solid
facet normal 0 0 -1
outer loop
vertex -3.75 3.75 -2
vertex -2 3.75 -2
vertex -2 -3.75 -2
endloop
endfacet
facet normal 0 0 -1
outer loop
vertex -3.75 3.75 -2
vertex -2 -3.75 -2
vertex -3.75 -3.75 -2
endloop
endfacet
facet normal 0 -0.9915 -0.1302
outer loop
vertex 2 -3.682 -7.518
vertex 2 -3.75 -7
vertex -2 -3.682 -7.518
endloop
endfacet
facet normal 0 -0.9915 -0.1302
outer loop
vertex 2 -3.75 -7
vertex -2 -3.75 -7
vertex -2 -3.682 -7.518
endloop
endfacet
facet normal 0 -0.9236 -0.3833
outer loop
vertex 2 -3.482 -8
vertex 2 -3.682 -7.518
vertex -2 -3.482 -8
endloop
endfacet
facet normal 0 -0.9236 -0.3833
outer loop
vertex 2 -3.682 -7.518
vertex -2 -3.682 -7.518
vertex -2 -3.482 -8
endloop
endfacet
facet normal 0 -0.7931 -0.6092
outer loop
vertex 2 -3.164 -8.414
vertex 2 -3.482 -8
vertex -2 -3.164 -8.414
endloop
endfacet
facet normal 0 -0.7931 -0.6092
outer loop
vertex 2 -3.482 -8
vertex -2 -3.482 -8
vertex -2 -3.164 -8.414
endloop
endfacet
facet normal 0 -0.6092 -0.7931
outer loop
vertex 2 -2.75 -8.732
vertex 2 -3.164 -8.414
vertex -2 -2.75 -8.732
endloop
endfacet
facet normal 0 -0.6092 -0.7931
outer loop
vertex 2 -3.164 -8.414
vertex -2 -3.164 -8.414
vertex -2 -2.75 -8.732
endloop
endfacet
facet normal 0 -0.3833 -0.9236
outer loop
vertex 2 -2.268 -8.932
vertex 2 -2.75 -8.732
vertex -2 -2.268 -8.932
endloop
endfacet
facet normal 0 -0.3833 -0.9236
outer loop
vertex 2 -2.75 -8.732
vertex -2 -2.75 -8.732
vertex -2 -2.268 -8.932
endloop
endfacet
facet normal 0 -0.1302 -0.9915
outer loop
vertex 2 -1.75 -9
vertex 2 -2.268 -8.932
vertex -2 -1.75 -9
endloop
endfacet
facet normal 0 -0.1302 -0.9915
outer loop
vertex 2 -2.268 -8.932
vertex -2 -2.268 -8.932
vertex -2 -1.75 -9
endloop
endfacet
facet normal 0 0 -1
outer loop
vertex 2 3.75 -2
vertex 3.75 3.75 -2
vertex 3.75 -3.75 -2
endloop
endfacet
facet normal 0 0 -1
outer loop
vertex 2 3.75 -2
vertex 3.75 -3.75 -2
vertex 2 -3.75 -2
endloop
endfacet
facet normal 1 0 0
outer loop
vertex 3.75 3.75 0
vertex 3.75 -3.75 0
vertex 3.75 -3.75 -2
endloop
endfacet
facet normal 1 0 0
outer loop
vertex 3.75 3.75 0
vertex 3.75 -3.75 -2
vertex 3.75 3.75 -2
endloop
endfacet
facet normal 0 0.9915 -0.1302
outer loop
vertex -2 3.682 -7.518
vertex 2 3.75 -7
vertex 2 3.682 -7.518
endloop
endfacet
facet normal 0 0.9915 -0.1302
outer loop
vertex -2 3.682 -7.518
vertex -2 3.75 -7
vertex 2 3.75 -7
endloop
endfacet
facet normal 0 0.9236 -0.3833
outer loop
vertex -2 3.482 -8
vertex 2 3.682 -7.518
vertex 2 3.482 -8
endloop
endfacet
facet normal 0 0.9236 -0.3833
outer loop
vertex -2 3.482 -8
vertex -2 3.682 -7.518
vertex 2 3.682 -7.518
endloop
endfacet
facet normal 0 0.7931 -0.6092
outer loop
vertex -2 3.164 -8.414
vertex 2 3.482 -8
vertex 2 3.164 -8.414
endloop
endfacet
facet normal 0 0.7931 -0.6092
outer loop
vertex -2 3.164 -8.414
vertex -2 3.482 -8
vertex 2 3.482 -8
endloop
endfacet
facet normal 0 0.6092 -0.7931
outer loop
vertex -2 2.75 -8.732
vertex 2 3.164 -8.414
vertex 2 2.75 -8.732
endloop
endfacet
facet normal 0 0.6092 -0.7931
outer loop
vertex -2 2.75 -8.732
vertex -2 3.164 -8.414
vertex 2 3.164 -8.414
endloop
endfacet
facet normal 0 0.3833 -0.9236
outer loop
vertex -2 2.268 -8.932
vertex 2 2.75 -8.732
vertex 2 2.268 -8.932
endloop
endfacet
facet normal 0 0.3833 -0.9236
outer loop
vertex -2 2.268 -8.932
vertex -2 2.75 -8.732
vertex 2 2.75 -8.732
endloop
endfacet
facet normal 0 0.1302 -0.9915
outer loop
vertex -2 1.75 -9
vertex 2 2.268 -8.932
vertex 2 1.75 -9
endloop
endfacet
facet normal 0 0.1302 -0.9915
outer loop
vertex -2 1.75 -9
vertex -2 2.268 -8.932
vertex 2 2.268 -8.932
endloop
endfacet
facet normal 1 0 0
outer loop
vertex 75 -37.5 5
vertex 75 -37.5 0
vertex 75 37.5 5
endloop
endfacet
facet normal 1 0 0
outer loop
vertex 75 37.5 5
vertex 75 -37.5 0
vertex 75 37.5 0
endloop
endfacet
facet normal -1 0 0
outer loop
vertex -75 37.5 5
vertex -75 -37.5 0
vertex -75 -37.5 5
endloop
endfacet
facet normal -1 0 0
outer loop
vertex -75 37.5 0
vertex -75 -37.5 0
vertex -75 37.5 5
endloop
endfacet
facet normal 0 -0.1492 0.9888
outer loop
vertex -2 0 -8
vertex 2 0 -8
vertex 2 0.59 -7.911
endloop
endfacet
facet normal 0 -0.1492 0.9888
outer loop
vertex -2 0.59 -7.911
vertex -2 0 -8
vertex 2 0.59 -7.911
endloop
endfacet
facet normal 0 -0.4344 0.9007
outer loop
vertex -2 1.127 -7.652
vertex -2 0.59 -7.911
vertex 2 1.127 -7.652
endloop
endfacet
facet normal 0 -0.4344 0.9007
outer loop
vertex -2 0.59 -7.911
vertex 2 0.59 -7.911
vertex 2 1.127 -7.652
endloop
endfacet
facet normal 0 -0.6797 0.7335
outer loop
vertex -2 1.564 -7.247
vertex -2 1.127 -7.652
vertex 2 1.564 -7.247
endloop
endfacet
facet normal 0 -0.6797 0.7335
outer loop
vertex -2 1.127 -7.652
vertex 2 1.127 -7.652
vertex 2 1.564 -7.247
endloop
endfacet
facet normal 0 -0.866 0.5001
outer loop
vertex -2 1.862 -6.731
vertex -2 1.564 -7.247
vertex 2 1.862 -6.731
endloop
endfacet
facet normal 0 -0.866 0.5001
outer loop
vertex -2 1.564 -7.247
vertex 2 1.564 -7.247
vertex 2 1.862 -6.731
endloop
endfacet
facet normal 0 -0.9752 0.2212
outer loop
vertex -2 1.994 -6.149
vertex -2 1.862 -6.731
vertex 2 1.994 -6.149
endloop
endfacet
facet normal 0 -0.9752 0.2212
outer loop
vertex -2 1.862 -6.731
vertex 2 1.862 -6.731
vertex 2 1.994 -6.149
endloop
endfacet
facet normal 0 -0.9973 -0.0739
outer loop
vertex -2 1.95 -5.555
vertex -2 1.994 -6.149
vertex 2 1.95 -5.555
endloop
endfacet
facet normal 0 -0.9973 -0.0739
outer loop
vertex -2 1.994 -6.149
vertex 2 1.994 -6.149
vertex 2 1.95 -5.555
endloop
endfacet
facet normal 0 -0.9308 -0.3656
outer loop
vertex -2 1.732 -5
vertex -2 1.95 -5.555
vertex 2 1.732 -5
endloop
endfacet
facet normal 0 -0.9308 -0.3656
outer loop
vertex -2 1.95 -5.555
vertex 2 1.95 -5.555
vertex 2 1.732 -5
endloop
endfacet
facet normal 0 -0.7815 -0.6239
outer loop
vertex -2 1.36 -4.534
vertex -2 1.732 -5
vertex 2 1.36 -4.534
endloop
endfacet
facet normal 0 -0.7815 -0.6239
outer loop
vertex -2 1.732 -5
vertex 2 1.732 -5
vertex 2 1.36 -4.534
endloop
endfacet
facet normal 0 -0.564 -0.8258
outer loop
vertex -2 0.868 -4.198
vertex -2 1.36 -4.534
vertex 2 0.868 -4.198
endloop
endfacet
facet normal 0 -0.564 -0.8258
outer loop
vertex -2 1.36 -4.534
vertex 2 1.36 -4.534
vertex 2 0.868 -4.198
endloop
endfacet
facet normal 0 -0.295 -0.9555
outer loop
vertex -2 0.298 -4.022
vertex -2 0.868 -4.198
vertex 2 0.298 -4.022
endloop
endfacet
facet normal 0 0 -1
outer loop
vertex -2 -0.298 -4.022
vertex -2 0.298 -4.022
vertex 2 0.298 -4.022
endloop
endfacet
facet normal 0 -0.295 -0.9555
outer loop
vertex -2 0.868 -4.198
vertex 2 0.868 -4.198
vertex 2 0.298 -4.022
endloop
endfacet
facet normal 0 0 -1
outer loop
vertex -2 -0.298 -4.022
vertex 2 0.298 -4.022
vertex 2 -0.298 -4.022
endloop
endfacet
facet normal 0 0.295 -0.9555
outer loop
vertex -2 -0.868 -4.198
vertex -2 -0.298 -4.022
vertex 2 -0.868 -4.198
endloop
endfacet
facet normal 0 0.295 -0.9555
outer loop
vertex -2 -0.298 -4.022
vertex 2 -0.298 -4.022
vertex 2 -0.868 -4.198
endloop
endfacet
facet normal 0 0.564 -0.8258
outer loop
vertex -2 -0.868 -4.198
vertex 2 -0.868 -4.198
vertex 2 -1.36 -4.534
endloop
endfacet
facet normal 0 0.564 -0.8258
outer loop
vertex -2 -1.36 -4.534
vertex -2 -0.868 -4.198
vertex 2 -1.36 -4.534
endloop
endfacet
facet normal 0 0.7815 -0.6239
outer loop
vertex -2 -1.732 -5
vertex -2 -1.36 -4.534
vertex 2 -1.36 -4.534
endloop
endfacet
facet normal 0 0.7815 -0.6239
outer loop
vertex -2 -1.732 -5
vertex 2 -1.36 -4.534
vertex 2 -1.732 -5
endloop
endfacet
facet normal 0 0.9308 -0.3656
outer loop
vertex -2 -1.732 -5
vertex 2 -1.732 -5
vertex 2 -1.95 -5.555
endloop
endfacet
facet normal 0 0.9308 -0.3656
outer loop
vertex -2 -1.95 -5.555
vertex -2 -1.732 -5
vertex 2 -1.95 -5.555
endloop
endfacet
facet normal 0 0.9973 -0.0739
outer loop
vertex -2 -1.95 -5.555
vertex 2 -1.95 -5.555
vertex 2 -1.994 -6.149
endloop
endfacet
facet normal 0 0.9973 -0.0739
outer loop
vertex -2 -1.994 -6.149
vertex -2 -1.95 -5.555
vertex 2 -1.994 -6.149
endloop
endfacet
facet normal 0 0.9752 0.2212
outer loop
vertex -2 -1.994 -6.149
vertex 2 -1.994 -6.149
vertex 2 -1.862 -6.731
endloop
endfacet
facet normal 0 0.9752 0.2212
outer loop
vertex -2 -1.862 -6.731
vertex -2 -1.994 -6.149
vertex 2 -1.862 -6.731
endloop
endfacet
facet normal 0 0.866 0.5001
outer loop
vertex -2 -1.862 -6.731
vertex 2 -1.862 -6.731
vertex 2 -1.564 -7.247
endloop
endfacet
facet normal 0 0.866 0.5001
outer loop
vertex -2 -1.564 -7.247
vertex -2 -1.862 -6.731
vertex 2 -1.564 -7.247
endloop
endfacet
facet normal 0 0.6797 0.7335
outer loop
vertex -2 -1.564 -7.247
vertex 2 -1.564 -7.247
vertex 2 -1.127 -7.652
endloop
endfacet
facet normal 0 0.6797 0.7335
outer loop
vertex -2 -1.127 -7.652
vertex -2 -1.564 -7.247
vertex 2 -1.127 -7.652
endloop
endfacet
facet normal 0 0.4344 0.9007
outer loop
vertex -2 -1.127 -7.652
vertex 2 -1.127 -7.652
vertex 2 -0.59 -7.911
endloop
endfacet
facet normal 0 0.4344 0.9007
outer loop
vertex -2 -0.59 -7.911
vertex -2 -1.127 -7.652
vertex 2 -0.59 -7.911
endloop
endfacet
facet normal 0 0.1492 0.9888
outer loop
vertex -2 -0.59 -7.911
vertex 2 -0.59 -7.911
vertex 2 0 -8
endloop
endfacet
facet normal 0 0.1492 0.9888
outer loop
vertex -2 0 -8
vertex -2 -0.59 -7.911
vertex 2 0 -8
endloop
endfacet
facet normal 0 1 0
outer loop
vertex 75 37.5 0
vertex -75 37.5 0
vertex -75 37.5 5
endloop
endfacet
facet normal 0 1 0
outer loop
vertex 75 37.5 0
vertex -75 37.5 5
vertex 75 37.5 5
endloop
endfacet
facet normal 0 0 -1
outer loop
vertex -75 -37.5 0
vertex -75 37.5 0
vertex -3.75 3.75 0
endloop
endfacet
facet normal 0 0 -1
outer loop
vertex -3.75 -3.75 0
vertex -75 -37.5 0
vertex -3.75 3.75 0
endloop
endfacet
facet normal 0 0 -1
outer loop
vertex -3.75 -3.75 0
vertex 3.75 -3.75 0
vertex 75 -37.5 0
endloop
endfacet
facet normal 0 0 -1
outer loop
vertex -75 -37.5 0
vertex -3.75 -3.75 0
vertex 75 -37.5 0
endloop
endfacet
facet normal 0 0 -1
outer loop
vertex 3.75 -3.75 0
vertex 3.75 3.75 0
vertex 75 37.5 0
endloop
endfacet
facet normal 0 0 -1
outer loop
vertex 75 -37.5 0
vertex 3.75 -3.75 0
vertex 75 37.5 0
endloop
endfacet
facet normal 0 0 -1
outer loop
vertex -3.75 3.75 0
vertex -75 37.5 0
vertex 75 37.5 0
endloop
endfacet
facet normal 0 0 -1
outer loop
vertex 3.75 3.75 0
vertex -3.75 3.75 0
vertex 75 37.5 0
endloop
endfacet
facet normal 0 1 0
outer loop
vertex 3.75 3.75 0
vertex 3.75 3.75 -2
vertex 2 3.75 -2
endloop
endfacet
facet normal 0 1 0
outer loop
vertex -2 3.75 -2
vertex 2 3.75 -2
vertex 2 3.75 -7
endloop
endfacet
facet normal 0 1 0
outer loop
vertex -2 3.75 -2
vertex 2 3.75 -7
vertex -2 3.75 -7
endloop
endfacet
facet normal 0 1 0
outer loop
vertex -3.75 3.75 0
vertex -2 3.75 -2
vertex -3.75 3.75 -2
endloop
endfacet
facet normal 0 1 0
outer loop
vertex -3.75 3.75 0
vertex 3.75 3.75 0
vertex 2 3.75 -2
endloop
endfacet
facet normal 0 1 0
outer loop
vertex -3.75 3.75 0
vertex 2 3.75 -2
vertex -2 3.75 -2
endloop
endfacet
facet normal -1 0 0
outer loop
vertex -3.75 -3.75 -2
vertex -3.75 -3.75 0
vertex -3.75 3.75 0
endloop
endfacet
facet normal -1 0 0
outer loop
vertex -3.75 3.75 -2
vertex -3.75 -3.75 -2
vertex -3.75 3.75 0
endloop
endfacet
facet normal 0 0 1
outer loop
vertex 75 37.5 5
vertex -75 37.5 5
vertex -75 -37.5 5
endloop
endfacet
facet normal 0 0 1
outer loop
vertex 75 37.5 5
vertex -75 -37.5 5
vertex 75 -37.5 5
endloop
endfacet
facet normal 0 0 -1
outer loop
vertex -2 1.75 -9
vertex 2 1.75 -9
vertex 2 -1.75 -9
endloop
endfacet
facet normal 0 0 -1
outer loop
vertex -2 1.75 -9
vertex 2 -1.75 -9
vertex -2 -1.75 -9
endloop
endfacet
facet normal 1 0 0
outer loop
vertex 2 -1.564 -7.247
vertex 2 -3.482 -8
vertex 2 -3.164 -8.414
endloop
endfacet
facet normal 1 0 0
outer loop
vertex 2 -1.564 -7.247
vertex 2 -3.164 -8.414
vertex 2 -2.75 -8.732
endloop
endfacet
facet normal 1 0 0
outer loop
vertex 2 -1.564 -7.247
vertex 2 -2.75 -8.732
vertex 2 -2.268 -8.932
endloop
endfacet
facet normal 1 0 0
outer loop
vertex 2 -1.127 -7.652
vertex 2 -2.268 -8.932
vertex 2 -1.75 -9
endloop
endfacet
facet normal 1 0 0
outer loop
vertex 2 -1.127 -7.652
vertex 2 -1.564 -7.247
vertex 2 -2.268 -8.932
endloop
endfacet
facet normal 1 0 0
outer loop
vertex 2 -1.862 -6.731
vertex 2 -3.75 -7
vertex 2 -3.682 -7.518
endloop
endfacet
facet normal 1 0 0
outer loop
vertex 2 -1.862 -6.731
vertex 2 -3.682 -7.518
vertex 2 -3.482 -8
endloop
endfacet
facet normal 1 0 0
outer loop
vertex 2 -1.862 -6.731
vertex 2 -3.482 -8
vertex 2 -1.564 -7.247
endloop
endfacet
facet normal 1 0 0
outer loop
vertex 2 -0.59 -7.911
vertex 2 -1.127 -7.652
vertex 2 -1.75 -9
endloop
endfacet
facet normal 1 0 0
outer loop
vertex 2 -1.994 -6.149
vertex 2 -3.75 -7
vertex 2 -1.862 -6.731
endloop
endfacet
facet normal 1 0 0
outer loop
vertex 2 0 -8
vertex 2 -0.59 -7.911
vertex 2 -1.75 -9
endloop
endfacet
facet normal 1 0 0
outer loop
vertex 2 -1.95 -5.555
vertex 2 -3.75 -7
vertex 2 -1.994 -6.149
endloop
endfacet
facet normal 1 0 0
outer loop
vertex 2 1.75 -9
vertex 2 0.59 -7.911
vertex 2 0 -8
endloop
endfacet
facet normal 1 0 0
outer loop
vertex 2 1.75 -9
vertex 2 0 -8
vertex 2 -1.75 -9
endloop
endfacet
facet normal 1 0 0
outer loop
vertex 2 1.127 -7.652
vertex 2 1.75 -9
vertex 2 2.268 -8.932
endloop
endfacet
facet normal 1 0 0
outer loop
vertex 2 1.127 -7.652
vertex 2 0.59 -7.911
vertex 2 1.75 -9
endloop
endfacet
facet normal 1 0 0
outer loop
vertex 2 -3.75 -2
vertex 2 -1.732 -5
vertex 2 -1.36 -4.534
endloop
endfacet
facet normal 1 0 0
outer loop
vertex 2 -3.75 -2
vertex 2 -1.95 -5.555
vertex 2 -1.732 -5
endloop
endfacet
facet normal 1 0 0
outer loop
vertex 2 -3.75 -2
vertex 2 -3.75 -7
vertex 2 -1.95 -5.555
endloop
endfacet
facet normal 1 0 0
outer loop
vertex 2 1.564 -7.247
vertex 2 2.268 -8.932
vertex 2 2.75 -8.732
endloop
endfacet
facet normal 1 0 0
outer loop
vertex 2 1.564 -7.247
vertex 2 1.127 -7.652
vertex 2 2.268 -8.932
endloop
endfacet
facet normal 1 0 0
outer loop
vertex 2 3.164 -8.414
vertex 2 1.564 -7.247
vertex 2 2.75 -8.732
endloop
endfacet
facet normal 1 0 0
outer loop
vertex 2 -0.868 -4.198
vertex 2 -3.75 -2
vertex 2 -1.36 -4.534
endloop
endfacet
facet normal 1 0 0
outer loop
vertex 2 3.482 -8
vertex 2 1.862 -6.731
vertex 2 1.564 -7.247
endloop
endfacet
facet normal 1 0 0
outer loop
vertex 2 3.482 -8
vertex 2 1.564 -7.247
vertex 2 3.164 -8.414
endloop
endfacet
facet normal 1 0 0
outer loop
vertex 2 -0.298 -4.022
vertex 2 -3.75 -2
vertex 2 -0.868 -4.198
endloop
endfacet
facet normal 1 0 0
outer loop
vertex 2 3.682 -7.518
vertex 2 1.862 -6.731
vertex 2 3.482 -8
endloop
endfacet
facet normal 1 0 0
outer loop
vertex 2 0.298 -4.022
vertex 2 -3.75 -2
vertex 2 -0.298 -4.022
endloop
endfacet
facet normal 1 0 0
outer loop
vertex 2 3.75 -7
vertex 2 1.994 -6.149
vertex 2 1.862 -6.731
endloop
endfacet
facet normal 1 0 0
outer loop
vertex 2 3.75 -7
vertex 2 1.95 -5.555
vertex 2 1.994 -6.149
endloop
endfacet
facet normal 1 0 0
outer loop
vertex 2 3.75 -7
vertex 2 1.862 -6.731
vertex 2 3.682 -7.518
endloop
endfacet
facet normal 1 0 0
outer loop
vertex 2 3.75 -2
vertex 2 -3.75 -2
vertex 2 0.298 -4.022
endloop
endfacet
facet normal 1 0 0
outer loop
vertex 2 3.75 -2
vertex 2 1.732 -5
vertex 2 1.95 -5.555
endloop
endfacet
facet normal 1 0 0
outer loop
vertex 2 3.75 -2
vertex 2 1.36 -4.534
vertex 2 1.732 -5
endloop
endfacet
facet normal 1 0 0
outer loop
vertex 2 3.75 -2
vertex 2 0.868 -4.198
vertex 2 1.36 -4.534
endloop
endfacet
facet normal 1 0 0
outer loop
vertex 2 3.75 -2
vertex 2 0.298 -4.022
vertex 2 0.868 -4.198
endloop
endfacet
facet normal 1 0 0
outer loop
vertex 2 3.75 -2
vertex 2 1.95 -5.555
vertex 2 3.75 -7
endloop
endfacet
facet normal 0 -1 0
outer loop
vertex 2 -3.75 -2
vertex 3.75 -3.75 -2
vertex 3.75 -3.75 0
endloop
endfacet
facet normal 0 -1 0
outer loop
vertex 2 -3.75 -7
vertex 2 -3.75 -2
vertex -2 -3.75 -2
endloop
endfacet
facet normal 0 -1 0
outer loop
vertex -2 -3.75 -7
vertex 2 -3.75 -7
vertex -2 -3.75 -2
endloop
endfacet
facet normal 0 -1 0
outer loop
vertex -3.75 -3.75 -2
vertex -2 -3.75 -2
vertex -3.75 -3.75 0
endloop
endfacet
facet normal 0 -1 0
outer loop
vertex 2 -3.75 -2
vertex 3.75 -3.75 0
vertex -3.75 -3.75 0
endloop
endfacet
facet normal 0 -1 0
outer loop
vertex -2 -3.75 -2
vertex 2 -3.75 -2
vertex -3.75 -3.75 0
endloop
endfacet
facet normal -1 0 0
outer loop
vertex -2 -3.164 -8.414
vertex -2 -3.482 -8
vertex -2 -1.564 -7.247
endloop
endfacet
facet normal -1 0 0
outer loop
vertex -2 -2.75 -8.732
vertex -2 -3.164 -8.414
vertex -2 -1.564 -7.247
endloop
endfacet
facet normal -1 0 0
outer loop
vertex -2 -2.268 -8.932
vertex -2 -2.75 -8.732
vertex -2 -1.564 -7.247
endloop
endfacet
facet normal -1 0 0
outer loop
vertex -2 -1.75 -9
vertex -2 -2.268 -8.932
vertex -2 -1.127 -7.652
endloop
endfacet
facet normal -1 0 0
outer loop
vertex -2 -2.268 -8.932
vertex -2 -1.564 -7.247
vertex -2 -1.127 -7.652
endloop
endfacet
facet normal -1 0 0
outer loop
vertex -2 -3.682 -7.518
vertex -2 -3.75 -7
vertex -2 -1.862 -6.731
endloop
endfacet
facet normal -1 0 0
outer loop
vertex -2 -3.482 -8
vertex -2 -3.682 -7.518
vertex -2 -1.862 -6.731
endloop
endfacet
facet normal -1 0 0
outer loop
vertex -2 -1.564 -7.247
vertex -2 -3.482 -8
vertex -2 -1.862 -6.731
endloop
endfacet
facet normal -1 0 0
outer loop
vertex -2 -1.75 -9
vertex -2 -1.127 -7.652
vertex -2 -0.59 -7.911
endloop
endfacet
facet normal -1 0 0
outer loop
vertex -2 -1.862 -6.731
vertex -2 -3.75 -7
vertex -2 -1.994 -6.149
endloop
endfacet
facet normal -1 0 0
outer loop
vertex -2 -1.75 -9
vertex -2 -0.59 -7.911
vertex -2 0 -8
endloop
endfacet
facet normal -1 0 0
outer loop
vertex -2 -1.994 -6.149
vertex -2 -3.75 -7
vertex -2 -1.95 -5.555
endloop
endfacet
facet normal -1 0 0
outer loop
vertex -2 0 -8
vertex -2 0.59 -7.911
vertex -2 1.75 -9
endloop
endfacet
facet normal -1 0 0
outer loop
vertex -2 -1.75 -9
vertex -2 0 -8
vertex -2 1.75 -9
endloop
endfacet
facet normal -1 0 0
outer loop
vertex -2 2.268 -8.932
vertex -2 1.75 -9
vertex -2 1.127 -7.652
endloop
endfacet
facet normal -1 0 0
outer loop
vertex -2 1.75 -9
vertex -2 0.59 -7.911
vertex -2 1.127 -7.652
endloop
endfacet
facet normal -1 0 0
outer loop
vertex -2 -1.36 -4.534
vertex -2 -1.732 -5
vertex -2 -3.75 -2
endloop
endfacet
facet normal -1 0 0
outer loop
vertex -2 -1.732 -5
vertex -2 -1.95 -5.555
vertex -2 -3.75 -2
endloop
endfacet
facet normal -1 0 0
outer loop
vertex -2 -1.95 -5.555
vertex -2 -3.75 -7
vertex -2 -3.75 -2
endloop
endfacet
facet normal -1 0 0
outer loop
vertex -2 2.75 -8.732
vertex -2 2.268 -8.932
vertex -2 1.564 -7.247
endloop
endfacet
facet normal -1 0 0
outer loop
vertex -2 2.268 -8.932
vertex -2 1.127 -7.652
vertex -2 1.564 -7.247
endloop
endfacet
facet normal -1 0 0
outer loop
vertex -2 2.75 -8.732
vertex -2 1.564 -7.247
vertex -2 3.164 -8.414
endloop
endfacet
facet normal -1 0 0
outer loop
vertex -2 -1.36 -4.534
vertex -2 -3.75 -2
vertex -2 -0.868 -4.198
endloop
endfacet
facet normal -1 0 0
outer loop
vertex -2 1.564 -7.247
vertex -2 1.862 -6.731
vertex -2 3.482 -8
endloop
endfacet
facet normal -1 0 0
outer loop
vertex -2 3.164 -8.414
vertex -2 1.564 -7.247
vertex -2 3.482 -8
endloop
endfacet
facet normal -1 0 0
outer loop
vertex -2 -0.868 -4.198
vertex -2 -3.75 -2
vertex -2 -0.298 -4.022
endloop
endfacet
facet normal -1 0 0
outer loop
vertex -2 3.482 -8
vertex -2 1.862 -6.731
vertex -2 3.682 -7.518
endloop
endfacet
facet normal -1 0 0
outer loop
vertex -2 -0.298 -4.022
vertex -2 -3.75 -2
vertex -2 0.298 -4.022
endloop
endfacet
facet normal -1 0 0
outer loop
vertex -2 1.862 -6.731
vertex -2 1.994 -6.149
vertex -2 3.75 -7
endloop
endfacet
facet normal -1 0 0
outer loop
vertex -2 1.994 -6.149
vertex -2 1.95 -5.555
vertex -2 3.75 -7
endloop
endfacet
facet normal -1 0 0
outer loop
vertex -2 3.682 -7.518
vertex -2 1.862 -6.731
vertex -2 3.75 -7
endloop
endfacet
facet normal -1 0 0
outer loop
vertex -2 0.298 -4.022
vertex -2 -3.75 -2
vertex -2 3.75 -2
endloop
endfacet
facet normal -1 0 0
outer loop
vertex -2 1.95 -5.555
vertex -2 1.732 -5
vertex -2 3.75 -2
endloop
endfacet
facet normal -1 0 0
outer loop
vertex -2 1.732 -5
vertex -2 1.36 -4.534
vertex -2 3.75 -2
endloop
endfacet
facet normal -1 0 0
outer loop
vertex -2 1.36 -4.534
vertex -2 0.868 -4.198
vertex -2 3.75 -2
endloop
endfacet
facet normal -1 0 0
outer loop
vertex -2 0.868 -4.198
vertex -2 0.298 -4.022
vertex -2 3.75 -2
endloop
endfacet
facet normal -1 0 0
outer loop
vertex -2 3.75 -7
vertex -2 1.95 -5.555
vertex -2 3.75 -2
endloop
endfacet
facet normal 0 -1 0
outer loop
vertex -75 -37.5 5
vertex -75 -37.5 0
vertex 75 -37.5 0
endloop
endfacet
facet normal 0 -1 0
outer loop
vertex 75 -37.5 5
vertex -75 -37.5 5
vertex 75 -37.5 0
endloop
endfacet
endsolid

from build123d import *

# Parameters (mm, degrees)
SKETCH1_W           = 150
SKETCH1_H           = 75
BOSS_EXTRUDE1_DEPTH = 5
SKETCH2_W           = 7.5
SKETCH2_H           = 7.5
BOSS_EXTRUDE2_DEPTH = 2
SKETCH3_W           = 4
SKETCH3_H           = 7.5
BOSS_EXTRUDE3_DEPTH = 7
FILLET1_R           = 2
SKETCH6_R           = 2
CUT_EXTRUDE1_DEPTH  = 5


with BuildPart() as part:
    # Sketch1 → Boss-Extrude1 (new body)
    with BuildSketch(Plane.XY):
        Rectangle(SKETCH1_W, SKETCH1_H)
    extrude(amount=BOSS_EXTRUDE1_DEPTH)

    # Sketch2 → Boss-Extrude2 (add)
    with BuildSketch(Plane(origin=(0, 0, 0), x_dir=(-1, 0, 0), z_dir=(0, 0, -1))):
        Rectangle(SKETCH2_W, SKETCH2_H)
    extrude(amount=BOSS_EXTRUDE2_DEPTH)

    # Sketch3 → Boss-Extrude3 (add)
    with BuildSketch(Plane(origin=(0, 0, -2), x_dir=(-1, 0, 0), z_dir=(0, 0, -1))):
        Rectangle(SKETCH3_W, SKETCH3_H)
    extrude(amount=BOSS_EXTRUDE3_DEPTH)

    # Fillet1
    fillet1_edges = [part.edges().sort_by_distance(p)[0] for p in [
        (0, 3.75, -9),
        (0, -3.75, -9),
    ]]
    fillet(fillet1_edges, radius=FILLET1_R)

    # Sketch6 → Cut-Extrude1 (cut)
    with BuildSketch(Plane(origin=(2, 0, 0), x_dir=(0, 0, -1), z_dir=(1, 0, 0))):
        with Locations((6, 0)):
            Circle(SKETCH6_R)
    extrude(amount=-CUT_EXTRUDE1_DEPTH, mode=Mode.SUBTRACT)


solid = part.part
